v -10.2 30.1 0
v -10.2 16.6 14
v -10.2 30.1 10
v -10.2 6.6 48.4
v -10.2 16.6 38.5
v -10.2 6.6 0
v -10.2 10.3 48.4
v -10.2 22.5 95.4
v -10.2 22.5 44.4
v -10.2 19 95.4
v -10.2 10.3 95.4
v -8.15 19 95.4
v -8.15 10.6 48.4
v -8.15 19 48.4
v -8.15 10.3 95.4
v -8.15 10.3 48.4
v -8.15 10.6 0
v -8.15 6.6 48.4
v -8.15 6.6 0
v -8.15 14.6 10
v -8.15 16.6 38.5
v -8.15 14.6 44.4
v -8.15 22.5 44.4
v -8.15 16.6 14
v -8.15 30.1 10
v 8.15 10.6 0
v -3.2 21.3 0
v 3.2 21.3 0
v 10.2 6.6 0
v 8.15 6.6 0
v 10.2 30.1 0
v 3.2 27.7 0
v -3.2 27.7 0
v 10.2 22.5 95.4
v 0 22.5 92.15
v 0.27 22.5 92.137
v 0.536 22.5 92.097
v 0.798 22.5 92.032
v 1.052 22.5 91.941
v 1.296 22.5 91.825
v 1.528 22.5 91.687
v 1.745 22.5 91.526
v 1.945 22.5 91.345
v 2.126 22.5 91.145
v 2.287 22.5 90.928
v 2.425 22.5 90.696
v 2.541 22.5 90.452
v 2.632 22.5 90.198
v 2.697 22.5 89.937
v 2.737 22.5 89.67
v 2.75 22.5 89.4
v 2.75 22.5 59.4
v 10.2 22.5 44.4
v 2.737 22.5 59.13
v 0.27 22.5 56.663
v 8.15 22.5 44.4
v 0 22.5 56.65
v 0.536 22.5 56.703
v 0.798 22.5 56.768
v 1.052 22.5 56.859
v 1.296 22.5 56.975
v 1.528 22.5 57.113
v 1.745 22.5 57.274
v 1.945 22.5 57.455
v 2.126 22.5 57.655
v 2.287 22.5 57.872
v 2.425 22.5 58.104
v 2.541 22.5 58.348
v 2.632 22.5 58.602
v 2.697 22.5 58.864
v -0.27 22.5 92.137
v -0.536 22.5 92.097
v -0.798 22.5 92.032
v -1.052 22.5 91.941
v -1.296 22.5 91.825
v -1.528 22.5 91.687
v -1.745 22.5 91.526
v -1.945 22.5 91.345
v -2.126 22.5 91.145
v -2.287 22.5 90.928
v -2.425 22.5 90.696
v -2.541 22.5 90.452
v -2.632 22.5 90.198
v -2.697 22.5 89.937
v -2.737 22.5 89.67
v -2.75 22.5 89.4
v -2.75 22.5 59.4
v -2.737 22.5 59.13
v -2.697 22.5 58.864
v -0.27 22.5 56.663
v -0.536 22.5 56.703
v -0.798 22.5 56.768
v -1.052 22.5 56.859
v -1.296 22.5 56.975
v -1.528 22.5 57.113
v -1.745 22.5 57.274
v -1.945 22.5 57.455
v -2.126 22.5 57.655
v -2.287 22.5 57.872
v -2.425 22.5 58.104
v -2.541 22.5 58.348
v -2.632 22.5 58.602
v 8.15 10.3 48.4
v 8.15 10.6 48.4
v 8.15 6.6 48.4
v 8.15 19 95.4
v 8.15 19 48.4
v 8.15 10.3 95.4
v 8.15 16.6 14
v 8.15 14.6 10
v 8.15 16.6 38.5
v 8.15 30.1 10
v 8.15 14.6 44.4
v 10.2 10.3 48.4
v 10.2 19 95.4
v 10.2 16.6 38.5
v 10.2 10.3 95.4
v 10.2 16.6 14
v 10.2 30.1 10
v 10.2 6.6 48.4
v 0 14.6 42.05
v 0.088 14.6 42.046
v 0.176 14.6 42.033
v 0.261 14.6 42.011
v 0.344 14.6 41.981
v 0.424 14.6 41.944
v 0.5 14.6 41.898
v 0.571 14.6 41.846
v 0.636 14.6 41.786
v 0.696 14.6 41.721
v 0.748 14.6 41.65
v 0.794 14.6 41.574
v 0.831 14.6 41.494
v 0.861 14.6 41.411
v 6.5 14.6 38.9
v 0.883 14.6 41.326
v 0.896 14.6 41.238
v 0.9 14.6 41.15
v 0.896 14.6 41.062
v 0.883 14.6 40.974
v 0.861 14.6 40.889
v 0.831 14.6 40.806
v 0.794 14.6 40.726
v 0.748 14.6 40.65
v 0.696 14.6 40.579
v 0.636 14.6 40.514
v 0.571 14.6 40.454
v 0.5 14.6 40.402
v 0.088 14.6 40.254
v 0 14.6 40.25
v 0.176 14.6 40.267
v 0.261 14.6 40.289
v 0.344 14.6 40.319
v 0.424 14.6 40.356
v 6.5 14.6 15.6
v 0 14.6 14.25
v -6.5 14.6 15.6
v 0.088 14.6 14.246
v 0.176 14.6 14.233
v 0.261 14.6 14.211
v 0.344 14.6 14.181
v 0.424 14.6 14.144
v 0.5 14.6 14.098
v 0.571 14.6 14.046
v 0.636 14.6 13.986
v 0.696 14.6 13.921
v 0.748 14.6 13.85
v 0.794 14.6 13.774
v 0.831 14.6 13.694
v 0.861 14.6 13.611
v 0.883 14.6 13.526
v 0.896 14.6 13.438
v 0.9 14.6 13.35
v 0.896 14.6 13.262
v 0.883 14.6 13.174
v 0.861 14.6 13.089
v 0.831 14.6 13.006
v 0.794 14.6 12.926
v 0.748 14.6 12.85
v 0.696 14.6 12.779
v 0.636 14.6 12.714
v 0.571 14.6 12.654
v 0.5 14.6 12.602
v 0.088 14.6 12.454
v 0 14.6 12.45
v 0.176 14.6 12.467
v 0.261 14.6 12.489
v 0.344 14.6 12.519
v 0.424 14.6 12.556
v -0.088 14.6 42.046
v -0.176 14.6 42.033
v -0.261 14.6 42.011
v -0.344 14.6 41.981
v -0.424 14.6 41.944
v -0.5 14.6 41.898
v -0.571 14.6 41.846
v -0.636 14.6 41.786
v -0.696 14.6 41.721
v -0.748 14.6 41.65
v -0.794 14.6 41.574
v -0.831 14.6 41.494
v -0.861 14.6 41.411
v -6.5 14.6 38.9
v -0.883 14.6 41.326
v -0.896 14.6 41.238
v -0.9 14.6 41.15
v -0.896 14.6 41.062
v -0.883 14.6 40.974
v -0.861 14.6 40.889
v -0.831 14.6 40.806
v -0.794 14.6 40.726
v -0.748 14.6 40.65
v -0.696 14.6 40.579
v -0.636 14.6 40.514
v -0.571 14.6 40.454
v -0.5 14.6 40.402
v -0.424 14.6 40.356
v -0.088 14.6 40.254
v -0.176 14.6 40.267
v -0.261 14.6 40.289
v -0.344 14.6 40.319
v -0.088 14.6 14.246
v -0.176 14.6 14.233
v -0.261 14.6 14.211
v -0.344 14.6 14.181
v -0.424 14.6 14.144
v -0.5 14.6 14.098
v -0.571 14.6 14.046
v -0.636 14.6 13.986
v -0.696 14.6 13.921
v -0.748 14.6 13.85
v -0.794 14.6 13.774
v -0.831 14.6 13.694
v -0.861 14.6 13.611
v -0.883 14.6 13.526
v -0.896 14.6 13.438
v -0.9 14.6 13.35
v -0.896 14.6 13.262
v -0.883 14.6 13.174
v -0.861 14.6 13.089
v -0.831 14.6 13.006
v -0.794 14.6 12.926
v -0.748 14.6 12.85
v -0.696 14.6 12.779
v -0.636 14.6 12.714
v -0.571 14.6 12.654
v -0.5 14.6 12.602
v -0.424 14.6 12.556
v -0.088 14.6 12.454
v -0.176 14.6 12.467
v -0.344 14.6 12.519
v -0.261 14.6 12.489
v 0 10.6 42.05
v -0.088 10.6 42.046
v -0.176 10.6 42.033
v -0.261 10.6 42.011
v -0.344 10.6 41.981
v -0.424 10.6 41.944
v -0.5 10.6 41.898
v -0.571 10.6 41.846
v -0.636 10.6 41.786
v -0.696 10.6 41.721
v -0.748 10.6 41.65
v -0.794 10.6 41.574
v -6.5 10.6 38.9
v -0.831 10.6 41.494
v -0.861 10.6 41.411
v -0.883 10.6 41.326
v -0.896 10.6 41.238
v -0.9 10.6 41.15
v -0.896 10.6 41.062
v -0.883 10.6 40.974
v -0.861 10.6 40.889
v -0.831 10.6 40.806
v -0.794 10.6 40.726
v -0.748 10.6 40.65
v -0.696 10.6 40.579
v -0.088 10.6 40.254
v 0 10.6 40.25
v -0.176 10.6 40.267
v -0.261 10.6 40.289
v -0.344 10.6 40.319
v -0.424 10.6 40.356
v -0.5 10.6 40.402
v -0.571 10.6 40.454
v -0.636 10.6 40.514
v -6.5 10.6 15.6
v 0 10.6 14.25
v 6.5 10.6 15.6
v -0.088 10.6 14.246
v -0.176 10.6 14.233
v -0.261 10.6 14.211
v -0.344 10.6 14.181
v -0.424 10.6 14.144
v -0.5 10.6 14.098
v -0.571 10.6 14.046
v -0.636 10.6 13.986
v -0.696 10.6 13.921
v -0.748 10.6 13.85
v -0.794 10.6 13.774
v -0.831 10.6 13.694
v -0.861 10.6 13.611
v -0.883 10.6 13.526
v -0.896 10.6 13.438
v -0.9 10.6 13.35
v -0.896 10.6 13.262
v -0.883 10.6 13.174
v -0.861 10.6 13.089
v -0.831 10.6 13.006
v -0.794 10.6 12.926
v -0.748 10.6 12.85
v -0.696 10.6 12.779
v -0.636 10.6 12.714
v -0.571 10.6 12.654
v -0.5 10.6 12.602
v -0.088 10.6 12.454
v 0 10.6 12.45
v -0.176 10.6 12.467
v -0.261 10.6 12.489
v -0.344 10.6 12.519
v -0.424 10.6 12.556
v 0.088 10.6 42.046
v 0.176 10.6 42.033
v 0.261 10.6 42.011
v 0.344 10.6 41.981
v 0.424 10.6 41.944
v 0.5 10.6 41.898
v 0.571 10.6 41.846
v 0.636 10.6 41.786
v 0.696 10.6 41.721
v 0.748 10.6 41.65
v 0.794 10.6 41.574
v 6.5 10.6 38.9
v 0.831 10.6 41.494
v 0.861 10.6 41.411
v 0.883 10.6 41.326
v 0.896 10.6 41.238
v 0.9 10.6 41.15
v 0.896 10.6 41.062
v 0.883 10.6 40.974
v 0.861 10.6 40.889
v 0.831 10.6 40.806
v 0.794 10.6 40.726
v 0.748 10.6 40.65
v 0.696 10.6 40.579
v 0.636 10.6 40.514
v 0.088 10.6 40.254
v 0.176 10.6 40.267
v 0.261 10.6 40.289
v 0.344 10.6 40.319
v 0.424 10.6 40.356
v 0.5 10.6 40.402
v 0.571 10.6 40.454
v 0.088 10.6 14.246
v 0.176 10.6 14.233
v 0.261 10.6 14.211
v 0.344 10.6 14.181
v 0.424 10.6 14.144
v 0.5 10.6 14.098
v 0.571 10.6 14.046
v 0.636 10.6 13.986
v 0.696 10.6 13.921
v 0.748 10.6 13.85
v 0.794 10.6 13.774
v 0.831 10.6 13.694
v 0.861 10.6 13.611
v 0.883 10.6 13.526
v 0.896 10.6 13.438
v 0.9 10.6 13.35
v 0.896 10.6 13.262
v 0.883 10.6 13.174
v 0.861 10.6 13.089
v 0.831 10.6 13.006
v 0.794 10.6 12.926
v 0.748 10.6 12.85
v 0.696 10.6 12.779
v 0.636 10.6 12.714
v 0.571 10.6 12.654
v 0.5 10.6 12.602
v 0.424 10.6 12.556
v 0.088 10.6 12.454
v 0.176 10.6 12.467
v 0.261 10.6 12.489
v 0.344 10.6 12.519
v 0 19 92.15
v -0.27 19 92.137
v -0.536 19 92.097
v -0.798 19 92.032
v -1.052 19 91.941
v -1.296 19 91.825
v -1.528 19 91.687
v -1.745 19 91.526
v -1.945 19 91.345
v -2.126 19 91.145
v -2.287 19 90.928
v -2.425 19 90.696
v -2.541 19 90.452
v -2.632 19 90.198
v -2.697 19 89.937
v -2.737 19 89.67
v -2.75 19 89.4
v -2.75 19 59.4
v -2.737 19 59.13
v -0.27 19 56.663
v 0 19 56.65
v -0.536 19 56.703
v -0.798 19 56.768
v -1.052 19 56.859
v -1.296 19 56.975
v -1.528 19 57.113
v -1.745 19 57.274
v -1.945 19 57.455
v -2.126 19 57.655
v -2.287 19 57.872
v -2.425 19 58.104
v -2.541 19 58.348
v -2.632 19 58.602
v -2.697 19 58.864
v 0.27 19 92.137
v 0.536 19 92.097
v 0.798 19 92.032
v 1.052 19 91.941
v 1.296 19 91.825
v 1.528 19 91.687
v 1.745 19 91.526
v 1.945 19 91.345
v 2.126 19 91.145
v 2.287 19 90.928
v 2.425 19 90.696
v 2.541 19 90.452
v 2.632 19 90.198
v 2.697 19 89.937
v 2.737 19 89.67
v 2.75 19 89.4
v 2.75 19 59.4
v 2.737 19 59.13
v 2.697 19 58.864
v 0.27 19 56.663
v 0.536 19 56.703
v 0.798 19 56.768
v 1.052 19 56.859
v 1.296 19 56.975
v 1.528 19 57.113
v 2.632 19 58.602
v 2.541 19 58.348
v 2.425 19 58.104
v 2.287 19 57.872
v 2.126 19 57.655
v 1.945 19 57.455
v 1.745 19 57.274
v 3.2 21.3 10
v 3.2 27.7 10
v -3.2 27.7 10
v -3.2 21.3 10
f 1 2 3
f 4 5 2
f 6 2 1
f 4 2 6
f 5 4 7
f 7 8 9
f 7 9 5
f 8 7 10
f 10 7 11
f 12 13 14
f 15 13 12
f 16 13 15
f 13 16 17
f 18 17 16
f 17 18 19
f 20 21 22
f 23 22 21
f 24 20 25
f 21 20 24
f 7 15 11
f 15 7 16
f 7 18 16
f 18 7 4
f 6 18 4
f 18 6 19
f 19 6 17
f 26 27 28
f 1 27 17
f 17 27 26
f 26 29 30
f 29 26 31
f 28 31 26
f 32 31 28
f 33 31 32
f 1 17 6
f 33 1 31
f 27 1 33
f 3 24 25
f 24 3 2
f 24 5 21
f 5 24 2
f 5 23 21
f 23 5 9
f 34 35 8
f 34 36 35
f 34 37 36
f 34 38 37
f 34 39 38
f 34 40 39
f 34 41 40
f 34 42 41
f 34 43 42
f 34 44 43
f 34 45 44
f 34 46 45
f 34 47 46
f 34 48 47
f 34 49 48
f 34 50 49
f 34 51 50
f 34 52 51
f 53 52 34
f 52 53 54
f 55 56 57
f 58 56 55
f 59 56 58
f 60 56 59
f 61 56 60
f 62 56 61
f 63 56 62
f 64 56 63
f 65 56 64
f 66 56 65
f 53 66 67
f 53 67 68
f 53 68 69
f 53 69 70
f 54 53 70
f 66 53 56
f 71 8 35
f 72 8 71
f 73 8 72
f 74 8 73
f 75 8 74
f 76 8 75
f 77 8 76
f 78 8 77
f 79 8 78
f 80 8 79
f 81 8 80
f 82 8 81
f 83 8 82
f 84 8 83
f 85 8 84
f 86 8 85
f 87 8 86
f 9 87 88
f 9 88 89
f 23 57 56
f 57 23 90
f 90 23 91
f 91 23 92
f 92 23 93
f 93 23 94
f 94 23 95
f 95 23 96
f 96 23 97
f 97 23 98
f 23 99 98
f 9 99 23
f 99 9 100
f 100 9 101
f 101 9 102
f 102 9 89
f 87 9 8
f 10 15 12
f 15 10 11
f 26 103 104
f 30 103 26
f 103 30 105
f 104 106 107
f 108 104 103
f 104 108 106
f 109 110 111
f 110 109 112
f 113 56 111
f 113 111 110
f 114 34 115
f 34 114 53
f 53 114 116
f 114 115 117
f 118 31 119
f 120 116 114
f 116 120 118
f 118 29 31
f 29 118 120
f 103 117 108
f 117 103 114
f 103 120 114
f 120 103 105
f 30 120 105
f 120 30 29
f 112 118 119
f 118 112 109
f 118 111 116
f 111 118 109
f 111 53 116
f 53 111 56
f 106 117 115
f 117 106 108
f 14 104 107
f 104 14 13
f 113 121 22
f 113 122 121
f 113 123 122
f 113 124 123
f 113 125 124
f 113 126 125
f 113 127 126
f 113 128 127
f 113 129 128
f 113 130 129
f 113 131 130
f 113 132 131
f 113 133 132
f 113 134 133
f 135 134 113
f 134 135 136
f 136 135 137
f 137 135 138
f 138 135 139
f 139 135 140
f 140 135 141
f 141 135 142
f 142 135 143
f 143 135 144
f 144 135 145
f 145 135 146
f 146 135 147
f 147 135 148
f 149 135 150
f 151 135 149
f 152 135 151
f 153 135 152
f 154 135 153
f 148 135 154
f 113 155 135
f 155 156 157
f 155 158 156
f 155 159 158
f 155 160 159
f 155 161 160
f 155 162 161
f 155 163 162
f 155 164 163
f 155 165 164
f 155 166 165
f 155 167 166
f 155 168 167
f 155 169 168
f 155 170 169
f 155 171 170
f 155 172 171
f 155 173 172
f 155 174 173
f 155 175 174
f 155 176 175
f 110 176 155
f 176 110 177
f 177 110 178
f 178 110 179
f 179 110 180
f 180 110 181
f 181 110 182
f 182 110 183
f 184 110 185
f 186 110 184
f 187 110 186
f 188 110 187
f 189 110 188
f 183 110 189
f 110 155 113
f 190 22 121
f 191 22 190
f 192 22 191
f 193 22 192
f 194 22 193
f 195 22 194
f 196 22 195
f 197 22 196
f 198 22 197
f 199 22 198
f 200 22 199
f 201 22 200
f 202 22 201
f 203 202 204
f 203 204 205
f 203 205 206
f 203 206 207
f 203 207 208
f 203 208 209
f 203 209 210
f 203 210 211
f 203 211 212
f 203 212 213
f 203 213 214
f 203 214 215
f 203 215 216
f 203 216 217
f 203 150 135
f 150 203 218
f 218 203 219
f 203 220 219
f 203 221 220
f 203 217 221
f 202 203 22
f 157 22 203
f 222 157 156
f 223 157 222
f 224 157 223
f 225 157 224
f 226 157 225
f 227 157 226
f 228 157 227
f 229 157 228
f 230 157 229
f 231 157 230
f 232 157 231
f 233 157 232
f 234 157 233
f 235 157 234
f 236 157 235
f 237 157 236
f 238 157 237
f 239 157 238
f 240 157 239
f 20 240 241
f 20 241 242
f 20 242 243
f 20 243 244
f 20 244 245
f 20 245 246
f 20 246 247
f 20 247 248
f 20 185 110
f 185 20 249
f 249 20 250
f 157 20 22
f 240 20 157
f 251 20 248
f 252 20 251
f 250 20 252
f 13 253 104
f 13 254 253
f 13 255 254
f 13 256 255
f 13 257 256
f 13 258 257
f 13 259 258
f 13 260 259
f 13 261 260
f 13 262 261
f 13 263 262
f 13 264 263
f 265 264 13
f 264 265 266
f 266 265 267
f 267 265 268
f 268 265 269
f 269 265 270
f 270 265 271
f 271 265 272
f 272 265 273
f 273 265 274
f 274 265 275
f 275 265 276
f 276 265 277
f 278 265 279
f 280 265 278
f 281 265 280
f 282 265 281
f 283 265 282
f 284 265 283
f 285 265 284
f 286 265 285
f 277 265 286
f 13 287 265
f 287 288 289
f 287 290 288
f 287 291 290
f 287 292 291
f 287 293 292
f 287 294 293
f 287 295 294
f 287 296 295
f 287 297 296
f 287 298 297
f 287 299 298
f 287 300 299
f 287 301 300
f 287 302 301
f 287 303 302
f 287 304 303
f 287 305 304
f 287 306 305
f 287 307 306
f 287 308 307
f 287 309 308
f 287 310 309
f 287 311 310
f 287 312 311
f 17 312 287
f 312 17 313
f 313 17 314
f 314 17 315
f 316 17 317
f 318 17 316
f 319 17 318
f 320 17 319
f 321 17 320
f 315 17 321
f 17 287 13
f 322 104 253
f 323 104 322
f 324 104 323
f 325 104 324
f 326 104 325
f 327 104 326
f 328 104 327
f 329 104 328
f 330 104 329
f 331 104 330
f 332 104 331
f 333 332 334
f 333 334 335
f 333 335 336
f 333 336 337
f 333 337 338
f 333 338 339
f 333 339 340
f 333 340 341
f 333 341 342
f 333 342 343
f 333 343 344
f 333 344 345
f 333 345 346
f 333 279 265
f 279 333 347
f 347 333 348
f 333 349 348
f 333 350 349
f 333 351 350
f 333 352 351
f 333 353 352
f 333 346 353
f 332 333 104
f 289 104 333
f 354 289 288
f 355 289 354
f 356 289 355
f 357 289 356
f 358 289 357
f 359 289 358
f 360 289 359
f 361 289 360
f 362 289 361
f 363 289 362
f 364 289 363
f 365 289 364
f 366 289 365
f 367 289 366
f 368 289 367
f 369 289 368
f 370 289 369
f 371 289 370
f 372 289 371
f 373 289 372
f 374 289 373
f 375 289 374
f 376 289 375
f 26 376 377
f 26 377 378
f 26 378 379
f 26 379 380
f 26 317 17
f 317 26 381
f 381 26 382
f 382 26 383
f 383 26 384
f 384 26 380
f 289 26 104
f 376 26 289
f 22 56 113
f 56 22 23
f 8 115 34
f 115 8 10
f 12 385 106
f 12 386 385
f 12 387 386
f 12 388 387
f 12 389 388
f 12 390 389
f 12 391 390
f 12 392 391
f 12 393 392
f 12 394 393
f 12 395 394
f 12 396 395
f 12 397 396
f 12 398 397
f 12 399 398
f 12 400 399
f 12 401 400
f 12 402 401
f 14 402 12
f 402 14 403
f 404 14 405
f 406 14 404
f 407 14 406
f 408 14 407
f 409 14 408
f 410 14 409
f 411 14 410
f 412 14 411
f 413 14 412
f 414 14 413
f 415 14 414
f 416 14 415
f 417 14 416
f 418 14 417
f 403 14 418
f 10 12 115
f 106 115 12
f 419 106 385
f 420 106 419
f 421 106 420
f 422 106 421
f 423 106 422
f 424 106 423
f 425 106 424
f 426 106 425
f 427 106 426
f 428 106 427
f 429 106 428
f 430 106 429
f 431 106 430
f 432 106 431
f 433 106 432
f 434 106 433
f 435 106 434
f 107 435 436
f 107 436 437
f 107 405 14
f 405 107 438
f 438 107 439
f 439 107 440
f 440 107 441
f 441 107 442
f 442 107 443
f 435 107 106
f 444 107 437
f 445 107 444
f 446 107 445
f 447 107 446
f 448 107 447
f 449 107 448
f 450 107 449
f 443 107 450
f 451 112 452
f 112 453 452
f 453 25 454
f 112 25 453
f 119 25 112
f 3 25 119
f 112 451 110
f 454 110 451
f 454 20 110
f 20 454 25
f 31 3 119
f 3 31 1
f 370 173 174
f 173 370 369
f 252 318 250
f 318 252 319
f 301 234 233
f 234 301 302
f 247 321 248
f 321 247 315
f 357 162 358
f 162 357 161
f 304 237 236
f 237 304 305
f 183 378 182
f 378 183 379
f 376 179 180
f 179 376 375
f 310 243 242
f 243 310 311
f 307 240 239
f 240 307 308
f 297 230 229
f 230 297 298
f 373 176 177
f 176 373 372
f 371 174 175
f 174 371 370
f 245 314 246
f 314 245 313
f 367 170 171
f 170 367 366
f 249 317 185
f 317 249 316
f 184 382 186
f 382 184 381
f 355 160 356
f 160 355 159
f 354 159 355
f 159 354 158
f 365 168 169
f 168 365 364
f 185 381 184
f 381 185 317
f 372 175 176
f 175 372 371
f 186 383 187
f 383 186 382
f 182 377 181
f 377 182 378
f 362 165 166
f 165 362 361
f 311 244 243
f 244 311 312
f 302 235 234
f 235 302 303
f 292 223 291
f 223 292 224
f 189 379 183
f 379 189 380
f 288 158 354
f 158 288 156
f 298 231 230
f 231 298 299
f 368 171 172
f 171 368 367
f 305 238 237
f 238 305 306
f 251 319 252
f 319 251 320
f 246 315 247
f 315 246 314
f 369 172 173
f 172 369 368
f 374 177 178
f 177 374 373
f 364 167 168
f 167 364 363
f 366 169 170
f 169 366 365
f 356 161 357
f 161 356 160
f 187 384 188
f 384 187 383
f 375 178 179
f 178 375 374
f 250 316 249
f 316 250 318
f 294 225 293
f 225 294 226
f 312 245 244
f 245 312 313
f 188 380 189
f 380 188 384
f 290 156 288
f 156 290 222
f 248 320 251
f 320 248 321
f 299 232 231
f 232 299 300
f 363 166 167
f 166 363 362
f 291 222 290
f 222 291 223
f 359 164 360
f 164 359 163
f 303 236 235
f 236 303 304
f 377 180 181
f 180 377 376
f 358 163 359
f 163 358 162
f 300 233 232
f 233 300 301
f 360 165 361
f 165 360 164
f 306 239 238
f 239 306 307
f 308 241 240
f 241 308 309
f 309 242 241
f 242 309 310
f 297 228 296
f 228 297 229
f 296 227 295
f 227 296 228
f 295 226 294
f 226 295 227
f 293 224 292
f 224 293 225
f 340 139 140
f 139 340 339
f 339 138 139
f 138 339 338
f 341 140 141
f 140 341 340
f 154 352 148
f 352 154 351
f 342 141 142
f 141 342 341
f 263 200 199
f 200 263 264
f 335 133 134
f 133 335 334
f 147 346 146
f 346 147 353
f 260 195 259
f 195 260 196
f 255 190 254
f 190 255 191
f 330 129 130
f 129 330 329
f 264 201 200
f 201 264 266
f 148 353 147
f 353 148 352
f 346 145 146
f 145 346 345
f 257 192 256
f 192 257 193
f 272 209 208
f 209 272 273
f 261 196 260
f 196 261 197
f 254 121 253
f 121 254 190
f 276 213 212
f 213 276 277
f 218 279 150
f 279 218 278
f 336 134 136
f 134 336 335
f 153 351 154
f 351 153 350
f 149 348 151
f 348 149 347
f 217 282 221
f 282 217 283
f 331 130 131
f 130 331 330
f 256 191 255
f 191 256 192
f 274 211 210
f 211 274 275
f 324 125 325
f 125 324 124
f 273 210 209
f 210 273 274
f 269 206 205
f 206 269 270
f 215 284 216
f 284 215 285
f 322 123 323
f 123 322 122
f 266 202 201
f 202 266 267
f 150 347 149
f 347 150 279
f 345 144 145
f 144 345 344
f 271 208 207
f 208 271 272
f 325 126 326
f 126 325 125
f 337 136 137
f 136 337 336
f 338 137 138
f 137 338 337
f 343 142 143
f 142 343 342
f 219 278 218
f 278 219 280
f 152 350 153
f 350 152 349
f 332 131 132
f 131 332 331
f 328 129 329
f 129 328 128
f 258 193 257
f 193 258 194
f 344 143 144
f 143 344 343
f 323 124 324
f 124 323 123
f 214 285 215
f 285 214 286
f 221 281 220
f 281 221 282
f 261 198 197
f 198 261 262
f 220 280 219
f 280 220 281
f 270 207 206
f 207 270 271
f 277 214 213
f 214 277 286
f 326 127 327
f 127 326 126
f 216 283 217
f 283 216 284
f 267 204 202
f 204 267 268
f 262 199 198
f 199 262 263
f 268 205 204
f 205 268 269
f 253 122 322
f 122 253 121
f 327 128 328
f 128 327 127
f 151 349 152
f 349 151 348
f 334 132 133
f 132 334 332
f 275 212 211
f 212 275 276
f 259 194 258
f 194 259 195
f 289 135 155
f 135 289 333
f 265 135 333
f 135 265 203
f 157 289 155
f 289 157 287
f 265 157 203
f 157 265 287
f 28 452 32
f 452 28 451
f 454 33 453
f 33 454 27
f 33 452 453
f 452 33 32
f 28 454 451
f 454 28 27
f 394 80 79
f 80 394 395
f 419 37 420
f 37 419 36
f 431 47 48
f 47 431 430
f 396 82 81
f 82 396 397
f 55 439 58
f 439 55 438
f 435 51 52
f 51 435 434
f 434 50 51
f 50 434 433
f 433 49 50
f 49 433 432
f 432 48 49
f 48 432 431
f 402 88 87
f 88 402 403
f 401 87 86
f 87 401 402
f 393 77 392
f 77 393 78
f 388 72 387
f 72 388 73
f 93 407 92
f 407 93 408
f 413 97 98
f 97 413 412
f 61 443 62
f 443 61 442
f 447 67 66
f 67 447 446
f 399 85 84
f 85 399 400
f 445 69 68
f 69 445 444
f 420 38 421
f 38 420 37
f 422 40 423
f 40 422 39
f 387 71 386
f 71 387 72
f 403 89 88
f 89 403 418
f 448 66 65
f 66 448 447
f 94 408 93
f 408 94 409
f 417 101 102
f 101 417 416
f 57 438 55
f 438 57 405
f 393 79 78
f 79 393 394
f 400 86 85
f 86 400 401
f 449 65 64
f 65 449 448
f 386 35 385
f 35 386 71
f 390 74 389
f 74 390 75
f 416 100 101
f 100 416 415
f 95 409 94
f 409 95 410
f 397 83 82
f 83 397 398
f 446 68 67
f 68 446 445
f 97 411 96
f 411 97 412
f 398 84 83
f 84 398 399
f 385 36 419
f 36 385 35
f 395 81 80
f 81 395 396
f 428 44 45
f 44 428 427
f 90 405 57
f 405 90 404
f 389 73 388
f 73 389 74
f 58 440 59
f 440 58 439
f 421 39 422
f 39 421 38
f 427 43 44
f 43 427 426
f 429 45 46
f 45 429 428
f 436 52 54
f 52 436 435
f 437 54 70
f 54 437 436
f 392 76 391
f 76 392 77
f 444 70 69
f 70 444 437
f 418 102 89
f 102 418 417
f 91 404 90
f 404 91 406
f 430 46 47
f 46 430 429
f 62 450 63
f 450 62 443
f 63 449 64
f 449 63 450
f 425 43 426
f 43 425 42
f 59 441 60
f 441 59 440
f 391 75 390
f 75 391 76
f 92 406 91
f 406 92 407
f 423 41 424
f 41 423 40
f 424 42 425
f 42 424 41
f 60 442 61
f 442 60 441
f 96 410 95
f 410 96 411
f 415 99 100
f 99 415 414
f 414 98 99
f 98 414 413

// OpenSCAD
// Servo module bracket: holds the servo and plunger guide, slides up and down the carriage. Print 4.
// Print orientation: upright, plunger guide end on the bed. No supports: the shelf bridges between the side walls.
include <params.scad>
include <lib.scad>

translate([0, 0, -sleeve_z0]) servo_bracket();
